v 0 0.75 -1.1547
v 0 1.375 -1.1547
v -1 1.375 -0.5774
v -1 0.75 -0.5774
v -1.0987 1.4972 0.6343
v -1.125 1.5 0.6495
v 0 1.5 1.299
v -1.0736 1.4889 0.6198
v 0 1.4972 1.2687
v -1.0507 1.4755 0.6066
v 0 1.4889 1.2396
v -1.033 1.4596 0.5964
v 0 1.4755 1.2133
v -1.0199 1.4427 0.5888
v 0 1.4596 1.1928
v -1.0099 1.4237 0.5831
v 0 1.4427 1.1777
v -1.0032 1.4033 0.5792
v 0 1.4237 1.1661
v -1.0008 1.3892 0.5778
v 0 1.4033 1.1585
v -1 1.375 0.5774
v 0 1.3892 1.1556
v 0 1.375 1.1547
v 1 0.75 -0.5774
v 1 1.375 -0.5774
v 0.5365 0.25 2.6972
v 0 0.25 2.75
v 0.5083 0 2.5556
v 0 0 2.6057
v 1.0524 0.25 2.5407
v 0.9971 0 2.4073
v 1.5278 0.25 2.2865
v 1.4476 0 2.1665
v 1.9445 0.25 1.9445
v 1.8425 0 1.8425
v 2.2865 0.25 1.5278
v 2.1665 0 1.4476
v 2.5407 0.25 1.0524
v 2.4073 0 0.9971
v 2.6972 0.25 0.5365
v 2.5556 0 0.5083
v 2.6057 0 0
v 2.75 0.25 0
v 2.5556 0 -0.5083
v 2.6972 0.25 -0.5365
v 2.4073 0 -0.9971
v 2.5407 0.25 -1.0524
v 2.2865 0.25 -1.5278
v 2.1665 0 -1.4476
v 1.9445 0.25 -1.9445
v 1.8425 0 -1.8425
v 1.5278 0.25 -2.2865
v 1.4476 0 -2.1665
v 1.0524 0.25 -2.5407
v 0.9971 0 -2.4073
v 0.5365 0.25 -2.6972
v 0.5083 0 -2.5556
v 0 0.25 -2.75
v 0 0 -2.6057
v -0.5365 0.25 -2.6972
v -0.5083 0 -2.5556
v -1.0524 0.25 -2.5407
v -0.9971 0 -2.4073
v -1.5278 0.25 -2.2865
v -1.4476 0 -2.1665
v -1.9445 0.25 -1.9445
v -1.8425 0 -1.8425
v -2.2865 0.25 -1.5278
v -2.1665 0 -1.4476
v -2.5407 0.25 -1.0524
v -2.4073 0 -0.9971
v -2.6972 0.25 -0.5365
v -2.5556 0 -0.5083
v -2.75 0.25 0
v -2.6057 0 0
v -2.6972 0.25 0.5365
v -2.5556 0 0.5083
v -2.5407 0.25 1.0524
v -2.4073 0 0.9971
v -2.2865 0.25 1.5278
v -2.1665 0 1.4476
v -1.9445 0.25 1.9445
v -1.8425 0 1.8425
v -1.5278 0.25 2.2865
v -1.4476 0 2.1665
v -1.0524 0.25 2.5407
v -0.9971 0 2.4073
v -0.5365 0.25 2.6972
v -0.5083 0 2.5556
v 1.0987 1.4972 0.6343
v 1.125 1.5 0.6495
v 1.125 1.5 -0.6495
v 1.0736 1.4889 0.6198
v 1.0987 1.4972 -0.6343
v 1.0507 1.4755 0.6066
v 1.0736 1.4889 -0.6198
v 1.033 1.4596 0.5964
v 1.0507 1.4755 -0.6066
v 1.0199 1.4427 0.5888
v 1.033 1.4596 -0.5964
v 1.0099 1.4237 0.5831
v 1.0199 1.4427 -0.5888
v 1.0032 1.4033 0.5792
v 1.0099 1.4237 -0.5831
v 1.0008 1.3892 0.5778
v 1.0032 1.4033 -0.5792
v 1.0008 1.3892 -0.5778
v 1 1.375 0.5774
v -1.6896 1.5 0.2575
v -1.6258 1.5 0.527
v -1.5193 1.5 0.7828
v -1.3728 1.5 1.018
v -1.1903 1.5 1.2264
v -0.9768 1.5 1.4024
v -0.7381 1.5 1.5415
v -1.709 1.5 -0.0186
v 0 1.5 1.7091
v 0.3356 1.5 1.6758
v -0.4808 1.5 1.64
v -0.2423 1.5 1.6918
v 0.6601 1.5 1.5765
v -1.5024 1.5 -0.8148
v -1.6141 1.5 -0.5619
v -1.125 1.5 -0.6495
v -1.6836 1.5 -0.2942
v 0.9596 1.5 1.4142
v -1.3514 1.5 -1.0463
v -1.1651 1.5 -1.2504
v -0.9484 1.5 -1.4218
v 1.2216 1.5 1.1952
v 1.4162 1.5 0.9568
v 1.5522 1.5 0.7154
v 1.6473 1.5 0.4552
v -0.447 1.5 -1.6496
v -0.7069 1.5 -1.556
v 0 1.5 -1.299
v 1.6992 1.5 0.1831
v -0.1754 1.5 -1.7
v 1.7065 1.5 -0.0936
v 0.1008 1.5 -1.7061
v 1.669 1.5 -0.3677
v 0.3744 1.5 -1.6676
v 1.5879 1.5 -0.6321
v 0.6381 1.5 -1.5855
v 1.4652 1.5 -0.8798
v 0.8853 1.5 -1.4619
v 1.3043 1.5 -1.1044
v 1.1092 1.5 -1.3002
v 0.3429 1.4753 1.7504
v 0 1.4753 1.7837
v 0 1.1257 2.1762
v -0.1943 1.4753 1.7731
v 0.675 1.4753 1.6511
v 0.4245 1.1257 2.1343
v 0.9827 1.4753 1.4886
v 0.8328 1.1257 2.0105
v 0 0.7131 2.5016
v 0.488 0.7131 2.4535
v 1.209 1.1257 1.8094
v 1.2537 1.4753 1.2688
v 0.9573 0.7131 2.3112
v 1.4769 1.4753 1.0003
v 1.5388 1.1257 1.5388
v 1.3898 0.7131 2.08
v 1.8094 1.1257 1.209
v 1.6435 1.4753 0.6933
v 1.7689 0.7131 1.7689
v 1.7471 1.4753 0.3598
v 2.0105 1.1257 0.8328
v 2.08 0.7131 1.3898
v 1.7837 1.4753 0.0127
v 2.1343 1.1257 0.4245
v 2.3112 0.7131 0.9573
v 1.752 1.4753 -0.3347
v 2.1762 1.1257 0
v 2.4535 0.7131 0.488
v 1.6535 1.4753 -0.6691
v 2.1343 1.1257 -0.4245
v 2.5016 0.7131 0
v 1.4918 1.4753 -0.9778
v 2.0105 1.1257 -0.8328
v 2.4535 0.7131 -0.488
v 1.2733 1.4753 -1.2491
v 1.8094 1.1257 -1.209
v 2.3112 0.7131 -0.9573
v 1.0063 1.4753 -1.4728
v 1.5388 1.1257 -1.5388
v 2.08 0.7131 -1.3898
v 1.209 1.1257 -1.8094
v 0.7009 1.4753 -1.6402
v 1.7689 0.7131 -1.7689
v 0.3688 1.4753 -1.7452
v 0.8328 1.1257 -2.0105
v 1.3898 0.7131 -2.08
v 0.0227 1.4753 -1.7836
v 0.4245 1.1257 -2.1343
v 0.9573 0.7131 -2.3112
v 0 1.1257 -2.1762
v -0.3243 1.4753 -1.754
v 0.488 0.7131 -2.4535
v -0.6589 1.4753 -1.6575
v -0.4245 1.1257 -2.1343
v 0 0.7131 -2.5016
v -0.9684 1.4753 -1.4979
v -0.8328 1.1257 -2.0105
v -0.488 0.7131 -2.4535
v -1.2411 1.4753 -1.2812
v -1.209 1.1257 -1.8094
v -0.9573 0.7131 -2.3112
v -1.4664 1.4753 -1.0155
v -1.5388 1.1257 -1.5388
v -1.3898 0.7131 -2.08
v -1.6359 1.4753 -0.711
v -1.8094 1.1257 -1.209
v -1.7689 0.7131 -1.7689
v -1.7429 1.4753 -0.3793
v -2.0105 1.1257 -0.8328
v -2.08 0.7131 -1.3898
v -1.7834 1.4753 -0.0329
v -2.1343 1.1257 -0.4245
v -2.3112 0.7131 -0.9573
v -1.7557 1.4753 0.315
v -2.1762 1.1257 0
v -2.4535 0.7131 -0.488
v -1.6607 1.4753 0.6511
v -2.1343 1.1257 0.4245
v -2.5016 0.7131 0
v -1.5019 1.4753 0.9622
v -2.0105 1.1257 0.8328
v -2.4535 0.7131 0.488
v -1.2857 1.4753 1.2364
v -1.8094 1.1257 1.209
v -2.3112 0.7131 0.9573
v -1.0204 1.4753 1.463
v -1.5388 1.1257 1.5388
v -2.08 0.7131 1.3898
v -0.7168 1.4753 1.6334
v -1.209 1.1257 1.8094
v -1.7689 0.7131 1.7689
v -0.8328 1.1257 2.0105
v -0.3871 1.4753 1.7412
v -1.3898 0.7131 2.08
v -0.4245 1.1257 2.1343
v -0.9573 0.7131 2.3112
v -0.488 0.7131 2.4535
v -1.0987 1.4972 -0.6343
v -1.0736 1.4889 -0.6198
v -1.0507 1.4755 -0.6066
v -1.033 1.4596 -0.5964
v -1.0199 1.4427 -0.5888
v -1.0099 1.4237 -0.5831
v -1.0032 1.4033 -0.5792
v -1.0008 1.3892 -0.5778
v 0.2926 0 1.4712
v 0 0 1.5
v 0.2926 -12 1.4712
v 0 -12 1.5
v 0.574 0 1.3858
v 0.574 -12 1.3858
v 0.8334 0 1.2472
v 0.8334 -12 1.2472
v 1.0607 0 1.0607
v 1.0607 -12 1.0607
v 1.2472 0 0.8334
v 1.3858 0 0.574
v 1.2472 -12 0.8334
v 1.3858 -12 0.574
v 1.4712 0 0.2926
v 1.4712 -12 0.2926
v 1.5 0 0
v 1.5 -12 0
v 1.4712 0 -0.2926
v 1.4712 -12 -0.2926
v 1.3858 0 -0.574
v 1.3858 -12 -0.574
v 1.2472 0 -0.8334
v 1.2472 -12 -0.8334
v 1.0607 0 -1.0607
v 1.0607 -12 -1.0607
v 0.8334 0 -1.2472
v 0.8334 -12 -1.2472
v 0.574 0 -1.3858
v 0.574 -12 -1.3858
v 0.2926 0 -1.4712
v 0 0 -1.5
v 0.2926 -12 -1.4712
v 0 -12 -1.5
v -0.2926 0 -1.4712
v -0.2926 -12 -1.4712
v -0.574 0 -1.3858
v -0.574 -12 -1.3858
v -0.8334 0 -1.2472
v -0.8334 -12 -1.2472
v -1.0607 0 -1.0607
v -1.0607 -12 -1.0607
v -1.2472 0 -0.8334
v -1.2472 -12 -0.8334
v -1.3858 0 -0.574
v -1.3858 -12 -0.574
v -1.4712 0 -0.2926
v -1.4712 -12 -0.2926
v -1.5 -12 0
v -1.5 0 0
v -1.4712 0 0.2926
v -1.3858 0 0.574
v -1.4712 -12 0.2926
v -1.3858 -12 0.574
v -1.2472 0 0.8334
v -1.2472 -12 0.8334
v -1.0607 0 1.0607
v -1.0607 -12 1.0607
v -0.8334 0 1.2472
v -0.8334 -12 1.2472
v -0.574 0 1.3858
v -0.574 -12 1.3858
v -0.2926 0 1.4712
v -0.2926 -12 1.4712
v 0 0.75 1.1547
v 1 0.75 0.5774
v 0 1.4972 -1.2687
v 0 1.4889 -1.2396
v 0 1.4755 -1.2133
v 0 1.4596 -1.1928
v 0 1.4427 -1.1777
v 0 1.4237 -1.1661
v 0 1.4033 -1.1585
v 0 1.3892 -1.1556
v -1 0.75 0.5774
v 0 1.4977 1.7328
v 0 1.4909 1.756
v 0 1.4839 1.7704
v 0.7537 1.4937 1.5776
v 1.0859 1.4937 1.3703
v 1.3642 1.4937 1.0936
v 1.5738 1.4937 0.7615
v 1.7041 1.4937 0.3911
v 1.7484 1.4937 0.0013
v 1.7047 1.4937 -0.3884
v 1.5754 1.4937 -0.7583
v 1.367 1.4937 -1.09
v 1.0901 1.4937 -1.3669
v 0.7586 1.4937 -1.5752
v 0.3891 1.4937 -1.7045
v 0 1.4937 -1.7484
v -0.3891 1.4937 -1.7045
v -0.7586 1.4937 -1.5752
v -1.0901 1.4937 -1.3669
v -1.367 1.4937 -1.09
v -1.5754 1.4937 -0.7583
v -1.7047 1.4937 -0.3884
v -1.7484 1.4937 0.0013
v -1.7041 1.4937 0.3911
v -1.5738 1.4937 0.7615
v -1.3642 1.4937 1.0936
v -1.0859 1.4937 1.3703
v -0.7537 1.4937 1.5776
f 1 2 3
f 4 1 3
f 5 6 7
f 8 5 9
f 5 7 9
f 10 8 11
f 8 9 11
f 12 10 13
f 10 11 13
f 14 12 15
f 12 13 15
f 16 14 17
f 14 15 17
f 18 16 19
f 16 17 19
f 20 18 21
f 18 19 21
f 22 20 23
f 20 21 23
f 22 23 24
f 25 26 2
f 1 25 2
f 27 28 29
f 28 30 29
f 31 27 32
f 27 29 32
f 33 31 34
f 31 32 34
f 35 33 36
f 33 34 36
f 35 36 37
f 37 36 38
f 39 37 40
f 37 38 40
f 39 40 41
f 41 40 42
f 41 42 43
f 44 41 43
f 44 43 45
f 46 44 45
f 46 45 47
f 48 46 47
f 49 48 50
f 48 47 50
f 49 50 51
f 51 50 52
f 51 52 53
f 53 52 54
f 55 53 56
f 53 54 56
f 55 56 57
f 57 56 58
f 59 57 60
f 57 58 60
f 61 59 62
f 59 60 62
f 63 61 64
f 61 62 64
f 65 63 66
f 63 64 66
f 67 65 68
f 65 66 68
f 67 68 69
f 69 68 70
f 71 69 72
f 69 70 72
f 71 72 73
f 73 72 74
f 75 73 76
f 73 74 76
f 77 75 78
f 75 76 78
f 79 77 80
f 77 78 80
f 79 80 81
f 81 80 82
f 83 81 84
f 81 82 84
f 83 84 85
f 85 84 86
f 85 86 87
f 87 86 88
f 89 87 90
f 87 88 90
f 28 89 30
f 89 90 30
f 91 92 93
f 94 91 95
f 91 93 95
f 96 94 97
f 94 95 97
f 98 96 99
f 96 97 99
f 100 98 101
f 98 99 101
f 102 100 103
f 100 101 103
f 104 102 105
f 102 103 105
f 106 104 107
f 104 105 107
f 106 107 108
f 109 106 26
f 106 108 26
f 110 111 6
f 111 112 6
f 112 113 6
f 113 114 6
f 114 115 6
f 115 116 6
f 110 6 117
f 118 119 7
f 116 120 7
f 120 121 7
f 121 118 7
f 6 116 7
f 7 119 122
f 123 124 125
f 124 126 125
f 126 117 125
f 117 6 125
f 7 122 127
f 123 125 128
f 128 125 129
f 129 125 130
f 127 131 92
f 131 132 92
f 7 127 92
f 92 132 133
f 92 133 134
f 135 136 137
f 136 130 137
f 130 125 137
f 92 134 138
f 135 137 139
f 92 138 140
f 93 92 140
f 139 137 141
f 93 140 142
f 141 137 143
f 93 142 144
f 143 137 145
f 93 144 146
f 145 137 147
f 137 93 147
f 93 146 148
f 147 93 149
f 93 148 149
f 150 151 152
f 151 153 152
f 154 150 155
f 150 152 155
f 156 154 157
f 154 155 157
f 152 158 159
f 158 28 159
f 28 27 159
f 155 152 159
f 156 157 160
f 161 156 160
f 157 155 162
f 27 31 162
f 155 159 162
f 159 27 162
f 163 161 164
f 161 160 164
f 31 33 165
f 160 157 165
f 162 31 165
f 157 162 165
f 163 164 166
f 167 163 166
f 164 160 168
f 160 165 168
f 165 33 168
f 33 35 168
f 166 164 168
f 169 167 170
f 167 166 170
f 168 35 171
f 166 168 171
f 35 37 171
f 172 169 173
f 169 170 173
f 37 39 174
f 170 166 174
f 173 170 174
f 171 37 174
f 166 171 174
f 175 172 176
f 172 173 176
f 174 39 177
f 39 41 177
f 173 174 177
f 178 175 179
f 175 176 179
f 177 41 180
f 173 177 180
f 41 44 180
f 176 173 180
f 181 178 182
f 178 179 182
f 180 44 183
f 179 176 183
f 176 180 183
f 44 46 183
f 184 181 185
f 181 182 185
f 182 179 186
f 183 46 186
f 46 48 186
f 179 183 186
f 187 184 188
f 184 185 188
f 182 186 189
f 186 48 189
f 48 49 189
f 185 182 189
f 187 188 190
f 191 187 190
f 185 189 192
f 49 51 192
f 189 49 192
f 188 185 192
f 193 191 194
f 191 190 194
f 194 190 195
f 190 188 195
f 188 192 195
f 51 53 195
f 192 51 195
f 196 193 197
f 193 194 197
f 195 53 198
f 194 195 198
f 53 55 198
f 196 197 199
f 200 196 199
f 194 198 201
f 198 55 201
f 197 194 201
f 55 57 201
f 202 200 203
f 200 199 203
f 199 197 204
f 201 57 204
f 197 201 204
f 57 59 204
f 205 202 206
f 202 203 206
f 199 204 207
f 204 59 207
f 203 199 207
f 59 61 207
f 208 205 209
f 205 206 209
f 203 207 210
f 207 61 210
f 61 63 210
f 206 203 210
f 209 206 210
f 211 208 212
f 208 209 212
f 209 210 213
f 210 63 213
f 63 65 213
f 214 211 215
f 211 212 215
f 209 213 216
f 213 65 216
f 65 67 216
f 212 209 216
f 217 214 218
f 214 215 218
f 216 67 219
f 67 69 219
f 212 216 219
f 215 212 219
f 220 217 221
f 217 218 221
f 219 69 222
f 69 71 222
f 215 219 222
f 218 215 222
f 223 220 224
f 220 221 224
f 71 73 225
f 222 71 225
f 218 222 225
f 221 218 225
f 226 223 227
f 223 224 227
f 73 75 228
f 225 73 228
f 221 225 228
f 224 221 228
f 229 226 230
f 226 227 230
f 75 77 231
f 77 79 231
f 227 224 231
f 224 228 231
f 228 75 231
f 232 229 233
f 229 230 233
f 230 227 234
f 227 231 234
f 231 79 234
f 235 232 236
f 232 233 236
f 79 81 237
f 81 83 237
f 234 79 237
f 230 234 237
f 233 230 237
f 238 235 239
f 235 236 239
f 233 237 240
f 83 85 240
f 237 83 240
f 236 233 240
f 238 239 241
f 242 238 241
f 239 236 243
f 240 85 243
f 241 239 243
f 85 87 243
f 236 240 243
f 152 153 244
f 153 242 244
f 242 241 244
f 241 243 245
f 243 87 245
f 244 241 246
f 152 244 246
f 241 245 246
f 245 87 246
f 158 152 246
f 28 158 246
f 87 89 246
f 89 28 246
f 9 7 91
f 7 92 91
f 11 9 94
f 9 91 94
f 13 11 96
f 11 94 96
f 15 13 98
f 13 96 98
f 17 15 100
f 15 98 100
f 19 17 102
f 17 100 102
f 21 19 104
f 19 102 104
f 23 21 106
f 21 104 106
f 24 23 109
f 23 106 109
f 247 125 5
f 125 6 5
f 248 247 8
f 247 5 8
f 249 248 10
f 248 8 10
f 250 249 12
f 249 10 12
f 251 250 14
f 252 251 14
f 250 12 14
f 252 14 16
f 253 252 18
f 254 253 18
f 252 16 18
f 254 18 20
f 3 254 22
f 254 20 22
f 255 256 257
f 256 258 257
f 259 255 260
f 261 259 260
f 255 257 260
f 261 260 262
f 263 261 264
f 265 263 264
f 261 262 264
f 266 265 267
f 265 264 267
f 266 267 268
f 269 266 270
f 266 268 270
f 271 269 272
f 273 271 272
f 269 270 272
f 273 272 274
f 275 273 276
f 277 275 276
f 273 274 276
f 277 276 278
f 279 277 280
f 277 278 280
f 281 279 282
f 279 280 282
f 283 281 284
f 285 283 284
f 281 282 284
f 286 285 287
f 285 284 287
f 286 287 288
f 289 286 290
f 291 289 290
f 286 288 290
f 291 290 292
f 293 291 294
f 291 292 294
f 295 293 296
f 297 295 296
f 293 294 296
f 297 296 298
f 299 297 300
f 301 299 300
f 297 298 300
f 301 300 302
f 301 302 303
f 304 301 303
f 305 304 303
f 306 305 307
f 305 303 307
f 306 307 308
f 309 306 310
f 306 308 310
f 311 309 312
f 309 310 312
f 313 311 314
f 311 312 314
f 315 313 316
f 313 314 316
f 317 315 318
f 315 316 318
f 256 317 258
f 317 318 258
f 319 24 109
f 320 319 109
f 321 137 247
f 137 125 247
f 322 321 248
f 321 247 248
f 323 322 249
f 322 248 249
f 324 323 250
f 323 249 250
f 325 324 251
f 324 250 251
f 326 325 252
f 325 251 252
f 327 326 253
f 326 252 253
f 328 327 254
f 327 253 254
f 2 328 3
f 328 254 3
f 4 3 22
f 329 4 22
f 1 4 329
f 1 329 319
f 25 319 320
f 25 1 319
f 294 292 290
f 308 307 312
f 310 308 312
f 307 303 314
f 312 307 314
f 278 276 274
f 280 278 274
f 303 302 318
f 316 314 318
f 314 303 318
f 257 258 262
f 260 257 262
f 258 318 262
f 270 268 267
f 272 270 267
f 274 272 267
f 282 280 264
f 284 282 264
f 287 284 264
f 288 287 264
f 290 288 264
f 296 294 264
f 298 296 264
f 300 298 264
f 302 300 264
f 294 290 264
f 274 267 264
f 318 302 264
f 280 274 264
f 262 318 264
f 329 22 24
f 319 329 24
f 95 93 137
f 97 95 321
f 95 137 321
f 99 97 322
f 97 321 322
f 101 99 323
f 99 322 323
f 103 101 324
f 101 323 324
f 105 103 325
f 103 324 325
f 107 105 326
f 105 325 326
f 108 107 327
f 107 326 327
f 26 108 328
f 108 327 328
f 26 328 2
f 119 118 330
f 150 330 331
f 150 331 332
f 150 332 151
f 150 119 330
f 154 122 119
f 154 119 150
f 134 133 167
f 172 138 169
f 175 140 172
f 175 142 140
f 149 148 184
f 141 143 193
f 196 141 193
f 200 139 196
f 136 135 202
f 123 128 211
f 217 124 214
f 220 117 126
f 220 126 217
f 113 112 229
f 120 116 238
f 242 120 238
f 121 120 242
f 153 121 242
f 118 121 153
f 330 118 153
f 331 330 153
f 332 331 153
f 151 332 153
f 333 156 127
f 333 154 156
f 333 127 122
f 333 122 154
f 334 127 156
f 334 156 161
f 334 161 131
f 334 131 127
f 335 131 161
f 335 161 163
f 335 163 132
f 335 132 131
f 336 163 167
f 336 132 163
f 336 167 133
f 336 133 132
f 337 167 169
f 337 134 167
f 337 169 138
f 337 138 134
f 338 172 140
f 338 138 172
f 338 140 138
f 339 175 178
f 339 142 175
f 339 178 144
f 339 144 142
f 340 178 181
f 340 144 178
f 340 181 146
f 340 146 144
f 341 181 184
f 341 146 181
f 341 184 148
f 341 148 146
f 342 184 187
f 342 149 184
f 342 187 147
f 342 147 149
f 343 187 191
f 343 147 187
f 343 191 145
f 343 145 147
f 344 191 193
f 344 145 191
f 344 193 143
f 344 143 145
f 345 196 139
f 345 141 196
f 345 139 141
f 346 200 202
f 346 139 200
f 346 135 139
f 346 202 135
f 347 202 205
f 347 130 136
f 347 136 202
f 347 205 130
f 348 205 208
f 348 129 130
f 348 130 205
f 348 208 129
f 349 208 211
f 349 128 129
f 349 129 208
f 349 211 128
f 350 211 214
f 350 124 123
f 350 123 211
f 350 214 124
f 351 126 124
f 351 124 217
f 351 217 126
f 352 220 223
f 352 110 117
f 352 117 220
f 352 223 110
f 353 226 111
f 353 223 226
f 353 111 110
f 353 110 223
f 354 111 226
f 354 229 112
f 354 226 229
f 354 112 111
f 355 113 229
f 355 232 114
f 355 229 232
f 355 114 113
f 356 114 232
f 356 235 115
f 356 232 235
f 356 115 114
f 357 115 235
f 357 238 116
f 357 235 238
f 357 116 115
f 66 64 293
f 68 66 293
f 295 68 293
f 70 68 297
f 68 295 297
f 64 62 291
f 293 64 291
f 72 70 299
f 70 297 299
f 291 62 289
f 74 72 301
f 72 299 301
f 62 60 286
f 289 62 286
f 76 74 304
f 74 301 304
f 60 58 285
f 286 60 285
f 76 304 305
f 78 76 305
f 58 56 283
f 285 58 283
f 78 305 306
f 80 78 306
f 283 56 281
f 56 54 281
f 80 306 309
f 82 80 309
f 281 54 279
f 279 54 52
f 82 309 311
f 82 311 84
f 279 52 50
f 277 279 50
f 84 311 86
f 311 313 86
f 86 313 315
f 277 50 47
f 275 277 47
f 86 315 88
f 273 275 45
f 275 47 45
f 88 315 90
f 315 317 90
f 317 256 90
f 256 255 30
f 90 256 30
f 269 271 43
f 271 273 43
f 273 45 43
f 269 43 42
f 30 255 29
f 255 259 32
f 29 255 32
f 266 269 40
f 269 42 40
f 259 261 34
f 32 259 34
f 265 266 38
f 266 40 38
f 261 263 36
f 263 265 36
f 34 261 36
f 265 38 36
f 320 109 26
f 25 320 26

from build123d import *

# Parameters (mm, degrees)
CUT_EXTRUDE1_DEPTH = 0.75
FILLET1_R          = 0.125


with BuildPart() as part:
    # Sketch1 → Revolve1 (revolve)
    with BuildSketch(Plane(origin=(0, 0, 0), x_dir=(0, 0, -1), z_dir=(1, 0, 0))):
        with BuildLine():
            Line((0, 1.5), (-1.75, 1.5))
            ThreePointArc((-1.75, 1.5), (-2.334912942, 0.942930354), (-2.75, 0.25))
            Line((-2.75, 0.25), (-2.605662433, 0))
            Line((-2.605662433, 0), (-1.5, 0))
            Line((-1.5, 0), (-1.5, -12))
            Line((-1.5, -12), (0, -12))
            Line((0, -12), (0, 1.5))
        make_face()
    revolve(axis=Axis((0, -12, 0), (0, 1, 0)))

    # Sketch2 → Cut-Extrude1 (cut)
    with BuildSketch(Plane(origin=(0, 1.5, 0), x_dir=(1, 0, 0), z_dir=(0, 1, 0))):
        Polygon((0, 1.154700538), (-1, 0.577350269), (-1, -0.577350269), (0, -1.154700538), (1, -0.577350269), (1, 0.577350269), align=None)
    extrude(amount=-CUT_EXTRUDE1_DEPTH, mode=Mode.SUBTRACT)

    # Fillet1
    fillet1_edges = [part.edges().sort_by_distance(p)[0] for p in [
        (0.5, 1.5, -0.866025404),
        (-0.5, 1.5, -0.866025404),
        (-1, 1.5, 0),
        (-0.5, 1.5, 0.866025404),
        (0.5, 1.5, 0.866025404),
        (1, 1.5, 0),
        (0, 1.5, -1.75),
    ]]
    fillet(fillet1_edges, radius=FILLET1_R)


solid = part.part
